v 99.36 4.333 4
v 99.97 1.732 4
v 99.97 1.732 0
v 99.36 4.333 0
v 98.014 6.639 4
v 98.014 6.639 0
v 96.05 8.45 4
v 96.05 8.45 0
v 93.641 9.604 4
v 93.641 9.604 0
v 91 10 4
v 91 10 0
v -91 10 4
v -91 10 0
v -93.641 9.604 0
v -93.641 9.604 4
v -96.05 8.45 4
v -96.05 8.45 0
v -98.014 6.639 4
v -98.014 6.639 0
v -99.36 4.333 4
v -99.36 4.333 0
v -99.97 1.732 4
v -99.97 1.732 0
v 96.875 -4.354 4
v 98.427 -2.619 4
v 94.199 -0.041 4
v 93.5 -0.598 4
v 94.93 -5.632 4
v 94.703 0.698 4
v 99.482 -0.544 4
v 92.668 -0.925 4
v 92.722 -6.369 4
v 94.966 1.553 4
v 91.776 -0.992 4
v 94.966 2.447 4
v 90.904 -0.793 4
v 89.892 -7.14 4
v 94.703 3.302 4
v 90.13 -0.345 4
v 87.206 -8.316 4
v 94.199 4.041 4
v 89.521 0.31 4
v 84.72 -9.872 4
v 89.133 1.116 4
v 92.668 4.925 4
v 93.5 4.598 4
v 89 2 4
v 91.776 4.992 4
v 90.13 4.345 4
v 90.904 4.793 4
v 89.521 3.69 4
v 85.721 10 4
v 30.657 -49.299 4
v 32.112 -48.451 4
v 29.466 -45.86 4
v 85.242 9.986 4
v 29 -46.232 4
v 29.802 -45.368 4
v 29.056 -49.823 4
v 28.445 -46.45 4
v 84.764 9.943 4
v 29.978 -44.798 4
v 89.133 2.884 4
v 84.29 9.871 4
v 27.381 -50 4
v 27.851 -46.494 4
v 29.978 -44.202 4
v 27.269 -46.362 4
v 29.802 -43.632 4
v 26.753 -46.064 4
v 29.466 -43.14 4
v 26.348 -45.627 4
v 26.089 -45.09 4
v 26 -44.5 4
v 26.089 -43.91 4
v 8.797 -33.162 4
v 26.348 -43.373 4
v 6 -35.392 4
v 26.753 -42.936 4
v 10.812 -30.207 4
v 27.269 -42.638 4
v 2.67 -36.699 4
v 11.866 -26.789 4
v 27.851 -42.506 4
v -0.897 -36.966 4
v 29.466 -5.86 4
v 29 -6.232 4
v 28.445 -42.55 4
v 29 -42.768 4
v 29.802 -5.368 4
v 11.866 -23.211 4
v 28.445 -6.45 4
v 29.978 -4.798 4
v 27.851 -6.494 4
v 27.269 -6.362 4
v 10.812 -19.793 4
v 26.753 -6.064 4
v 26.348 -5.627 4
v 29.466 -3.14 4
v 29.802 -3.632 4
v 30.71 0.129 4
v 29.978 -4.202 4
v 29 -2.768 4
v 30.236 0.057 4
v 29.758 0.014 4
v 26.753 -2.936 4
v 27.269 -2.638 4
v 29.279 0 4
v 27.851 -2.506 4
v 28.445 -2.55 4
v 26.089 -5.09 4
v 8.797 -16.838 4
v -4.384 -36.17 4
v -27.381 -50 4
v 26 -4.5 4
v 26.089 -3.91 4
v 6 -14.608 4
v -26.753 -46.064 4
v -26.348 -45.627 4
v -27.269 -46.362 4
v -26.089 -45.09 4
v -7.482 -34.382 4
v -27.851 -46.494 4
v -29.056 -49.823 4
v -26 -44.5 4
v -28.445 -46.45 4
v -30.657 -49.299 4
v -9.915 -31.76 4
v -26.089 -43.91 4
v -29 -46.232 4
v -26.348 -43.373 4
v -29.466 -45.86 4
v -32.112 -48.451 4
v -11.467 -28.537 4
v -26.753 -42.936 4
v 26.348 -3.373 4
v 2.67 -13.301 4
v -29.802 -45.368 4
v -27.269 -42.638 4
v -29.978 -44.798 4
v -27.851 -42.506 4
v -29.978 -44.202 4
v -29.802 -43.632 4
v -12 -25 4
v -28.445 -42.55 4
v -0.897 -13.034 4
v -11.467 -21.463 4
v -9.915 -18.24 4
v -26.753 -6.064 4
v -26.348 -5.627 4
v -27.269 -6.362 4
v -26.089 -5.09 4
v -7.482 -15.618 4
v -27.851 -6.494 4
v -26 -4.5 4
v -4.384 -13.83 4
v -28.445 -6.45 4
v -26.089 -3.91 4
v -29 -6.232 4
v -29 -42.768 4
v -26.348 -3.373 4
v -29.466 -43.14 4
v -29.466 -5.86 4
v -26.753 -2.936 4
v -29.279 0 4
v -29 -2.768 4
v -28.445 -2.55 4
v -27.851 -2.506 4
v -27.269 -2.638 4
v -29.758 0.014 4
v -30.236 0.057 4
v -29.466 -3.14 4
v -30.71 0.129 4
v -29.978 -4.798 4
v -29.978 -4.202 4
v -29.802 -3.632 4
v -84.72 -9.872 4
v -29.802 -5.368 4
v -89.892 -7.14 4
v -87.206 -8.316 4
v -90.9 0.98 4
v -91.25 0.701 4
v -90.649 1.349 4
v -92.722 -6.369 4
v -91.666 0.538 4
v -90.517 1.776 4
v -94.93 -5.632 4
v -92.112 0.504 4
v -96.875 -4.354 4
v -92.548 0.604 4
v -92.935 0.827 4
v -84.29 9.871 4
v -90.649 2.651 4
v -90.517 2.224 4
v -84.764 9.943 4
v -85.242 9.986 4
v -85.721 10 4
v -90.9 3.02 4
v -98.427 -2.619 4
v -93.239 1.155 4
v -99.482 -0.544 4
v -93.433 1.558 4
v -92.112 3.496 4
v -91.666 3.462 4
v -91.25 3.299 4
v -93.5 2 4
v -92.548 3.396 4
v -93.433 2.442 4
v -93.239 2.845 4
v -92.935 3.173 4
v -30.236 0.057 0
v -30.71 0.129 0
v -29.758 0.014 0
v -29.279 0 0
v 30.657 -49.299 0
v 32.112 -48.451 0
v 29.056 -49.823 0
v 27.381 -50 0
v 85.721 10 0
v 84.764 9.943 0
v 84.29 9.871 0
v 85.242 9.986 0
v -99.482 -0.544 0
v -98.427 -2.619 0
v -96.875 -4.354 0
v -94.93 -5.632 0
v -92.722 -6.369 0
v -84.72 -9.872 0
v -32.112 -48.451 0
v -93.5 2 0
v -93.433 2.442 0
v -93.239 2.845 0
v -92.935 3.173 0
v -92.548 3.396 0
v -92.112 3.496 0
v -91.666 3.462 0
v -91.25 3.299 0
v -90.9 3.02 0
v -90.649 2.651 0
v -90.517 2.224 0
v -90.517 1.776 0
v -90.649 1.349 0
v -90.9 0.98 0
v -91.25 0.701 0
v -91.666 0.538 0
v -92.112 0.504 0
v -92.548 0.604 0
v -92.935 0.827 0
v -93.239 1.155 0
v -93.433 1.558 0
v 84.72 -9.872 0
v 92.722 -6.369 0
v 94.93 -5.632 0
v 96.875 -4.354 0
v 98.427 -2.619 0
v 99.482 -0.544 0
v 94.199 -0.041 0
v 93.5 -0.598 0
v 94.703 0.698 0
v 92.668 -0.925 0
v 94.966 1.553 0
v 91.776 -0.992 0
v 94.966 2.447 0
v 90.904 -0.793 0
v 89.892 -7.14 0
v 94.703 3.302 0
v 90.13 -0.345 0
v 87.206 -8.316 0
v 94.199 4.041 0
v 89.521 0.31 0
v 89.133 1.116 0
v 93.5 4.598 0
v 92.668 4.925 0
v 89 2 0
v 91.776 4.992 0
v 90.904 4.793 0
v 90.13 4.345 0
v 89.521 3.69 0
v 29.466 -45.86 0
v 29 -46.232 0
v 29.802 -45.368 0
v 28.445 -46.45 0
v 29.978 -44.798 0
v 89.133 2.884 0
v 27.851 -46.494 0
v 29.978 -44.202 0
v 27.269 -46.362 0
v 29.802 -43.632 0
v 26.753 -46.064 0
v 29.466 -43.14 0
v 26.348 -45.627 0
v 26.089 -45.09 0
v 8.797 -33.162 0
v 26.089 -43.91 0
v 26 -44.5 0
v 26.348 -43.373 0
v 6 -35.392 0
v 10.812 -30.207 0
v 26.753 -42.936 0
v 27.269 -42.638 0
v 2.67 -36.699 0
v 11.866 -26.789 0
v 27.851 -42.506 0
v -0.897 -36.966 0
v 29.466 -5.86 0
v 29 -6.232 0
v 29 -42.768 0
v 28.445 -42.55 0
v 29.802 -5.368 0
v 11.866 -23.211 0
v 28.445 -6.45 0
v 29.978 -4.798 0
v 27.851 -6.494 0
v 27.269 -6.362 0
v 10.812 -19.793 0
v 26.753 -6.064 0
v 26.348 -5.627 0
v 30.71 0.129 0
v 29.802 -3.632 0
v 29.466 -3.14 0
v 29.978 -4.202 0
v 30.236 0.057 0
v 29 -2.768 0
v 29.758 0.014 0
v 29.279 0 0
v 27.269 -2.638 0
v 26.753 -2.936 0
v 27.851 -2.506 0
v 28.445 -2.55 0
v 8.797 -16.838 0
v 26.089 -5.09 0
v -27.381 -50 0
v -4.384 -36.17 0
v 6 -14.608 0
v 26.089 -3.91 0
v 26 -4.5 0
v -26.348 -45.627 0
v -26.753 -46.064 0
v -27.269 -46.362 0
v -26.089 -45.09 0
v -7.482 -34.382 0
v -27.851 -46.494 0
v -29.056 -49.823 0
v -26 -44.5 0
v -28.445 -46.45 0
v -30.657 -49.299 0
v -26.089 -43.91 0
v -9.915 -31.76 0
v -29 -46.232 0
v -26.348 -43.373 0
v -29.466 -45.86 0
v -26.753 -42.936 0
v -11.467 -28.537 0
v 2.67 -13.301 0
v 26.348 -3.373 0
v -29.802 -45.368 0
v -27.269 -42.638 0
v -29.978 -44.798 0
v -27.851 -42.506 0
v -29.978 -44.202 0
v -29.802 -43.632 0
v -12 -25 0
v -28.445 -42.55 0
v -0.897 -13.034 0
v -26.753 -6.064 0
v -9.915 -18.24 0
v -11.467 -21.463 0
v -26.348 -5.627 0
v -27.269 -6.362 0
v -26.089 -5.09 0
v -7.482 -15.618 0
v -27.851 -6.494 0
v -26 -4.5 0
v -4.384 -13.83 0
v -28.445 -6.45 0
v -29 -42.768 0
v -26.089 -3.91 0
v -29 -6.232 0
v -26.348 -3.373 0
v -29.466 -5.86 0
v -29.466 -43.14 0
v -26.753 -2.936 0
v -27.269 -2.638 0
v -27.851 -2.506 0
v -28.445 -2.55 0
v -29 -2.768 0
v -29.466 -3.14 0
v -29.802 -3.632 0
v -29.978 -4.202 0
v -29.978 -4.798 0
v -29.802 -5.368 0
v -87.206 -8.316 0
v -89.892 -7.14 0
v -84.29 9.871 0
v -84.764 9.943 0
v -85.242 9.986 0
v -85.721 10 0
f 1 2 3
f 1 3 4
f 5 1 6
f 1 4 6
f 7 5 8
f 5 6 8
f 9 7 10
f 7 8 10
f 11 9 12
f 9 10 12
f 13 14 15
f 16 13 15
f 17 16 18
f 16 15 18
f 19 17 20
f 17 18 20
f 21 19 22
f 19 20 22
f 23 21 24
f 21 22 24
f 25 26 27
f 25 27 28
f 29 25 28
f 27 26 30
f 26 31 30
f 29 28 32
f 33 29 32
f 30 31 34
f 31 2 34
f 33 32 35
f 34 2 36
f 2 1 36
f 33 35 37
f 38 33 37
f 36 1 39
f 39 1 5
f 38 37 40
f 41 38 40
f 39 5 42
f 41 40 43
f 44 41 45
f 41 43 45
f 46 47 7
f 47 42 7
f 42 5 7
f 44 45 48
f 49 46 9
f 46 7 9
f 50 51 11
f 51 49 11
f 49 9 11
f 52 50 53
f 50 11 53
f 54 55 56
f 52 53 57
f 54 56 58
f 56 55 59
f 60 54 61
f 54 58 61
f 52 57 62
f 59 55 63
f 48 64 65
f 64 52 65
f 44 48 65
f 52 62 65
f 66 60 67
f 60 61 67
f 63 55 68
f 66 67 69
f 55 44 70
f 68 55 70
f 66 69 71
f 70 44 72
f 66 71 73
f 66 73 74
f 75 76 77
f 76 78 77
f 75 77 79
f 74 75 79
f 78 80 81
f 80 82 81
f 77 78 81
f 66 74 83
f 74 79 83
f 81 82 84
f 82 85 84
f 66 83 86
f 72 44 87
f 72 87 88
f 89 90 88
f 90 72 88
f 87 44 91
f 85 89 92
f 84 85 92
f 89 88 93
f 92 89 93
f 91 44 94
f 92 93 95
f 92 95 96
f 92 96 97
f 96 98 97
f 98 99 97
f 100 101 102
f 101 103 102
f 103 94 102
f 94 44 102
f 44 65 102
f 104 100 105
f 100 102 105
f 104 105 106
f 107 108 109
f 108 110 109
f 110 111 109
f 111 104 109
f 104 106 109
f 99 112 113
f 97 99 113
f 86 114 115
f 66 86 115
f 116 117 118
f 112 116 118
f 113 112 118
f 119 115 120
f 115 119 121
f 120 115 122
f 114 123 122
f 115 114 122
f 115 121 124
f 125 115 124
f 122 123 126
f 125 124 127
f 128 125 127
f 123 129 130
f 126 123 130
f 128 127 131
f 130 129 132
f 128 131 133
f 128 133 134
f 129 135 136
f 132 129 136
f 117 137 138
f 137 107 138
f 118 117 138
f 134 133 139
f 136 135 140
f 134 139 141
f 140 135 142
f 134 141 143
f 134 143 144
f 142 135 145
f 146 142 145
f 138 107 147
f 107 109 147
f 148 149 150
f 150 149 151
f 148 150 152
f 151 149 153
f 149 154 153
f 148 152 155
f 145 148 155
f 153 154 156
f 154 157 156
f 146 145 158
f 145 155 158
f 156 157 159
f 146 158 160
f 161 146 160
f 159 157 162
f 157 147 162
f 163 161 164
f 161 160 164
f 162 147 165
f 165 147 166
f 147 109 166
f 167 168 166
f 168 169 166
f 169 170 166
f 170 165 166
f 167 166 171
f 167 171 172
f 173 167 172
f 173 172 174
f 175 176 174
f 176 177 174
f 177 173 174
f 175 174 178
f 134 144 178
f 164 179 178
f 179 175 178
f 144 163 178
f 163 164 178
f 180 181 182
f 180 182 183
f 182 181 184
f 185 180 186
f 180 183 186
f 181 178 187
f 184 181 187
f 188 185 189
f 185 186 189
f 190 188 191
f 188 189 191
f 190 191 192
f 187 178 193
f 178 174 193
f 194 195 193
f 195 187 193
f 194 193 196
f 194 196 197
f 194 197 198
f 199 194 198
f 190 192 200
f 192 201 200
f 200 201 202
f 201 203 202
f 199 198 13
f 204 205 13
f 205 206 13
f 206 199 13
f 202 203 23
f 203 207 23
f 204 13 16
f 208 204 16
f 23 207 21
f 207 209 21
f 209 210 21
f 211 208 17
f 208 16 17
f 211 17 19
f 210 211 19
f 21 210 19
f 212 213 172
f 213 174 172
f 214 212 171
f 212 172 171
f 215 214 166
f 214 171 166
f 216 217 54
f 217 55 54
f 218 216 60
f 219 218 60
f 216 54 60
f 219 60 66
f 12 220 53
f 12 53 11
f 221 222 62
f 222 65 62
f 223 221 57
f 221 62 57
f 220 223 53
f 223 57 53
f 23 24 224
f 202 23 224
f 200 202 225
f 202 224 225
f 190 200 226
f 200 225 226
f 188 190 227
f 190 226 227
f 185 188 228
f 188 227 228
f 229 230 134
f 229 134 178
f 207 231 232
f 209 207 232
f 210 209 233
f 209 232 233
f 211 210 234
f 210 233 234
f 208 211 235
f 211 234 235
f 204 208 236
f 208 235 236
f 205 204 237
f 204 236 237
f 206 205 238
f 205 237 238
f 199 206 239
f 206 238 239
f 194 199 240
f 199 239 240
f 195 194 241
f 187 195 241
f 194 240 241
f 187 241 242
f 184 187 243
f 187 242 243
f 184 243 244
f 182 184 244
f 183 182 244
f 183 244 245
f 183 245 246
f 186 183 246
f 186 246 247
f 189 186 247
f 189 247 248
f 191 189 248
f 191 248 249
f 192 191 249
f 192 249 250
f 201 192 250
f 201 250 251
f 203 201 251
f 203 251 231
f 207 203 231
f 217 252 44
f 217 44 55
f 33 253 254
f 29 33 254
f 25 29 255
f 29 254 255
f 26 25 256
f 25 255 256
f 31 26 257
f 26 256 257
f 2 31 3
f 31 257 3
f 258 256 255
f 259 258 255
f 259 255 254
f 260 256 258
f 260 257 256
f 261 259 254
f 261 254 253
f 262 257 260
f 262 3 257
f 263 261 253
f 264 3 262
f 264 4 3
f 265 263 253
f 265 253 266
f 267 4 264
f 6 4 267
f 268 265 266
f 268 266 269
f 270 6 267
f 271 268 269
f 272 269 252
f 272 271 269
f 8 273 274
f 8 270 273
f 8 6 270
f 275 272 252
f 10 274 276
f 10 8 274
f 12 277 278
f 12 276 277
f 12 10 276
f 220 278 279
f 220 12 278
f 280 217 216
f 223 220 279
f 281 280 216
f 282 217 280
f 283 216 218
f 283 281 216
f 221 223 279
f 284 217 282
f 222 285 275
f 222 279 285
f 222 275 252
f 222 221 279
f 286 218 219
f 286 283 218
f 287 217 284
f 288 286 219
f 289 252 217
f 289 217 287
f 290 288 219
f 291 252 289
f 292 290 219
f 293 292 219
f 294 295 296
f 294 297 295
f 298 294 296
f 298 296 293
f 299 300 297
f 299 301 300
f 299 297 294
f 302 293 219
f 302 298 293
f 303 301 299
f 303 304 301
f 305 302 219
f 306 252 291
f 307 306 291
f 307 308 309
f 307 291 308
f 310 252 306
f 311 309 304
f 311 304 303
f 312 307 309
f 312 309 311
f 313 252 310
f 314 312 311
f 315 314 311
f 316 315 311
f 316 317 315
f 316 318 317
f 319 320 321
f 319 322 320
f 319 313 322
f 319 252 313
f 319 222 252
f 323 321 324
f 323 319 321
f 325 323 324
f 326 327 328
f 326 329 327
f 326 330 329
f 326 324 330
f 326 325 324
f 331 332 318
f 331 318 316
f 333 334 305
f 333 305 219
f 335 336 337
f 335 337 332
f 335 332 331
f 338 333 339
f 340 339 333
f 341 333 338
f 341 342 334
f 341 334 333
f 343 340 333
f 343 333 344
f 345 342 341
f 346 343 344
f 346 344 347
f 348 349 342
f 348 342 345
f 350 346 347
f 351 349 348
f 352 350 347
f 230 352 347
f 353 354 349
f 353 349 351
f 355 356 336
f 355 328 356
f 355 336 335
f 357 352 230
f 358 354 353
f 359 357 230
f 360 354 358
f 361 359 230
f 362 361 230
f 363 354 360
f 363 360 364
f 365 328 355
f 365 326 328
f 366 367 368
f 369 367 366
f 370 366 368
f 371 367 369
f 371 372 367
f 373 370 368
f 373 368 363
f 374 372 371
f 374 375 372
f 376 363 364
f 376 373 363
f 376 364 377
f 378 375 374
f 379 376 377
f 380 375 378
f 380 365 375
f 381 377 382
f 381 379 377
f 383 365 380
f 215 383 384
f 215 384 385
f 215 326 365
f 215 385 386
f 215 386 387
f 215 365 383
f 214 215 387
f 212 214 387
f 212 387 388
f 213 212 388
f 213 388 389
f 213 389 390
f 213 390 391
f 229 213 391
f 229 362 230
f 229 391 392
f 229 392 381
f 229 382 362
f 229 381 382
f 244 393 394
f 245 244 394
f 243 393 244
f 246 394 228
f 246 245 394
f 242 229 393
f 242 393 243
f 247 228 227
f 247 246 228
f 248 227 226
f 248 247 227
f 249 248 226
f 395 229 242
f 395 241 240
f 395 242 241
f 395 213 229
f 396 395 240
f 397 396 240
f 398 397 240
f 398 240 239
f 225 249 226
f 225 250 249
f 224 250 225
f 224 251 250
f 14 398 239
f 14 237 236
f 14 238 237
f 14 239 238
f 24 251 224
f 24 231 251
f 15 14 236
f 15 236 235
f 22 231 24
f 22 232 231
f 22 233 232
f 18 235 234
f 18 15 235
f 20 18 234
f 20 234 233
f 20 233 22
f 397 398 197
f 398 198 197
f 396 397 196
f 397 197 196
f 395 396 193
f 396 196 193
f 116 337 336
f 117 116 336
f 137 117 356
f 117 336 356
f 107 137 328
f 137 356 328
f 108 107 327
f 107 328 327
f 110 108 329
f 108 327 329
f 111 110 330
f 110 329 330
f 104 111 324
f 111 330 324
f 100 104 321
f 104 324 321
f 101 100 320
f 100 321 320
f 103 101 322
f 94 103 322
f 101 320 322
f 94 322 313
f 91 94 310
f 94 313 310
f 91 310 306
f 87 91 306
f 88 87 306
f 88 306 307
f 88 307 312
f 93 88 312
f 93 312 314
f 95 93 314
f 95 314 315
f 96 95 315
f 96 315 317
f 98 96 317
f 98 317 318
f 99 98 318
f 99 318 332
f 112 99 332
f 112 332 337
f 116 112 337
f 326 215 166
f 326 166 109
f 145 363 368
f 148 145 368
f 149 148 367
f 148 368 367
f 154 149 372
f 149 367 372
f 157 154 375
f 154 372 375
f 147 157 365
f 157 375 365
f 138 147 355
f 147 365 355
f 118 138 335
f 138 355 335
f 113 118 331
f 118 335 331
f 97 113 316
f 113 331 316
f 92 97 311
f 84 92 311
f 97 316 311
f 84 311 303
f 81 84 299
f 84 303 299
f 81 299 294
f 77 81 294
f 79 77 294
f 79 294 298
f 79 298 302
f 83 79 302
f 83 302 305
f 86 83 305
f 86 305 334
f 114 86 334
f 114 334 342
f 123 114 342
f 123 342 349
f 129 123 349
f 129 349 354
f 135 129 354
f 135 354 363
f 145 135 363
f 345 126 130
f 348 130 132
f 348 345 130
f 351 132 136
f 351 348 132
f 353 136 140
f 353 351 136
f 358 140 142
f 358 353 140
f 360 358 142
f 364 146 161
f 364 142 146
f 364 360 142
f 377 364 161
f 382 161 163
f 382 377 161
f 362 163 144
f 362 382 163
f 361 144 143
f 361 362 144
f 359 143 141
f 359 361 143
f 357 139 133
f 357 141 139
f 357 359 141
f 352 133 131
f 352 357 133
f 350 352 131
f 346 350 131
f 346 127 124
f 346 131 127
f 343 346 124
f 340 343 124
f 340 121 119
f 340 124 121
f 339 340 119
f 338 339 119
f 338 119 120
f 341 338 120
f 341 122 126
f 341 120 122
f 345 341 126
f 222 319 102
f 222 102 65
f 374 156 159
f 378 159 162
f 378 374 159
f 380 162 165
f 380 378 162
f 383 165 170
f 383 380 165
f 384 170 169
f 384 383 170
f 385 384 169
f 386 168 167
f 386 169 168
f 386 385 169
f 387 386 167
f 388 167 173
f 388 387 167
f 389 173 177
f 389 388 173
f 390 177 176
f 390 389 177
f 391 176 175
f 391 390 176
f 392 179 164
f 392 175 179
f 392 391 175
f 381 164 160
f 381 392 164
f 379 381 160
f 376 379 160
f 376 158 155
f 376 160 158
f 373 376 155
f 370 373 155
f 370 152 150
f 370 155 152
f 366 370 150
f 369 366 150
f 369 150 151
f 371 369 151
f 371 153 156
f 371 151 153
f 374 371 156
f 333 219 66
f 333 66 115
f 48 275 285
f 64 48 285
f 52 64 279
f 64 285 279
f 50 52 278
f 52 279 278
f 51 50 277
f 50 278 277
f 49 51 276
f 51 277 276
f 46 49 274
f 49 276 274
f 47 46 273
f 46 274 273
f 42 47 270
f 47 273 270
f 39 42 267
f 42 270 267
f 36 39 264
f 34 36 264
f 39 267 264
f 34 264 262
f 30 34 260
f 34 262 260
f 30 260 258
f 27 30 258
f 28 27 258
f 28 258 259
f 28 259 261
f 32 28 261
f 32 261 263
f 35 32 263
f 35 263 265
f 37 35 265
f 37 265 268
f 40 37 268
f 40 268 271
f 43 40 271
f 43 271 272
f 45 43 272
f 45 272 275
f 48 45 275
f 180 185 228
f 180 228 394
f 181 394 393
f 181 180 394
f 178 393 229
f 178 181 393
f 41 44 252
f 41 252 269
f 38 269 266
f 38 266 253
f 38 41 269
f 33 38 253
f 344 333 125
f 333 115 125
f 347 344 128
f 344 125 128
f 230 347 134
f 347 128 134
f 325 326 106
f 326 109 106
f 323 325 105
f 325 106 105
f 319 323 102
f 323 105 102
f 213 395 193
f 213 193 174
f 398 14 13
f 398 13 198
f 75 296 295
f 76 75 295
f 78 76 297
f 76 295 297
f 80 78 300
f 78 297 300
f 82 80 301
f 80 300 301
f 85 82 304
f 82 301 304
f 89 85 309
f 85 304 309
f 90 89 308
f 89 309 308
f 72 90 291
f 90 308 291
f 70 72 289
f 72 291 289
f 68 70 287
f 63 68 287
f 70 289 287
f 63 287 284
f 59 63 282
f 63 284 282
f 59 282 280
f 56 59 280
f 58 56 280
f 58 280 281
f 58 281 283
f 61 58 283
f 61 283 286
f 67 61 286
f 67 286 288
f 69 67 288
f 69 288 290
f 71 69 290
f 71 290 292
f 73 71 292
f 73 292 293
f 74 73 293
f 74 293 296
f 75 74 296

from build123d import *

# Parameters (mm, degrees)
EXTRUDE_1_DEPTH     = 4
FILLET_1_R          = 8
FILLET_2_R          = 20
SKETCH_3_R          = 2
CUT_EXTRUDE_2_DEPTH = 112.874930168
SKETCH_2_R          = 12
CUT_EXTRUDE_1_DEPTH = 112.874930168
SKETCH_4_R          = 1.5
CUT_EXTRUDE_3_DEPTH = 112.874930168
FILLET_3_R          = 9
SKETCH_5_R          = 3
SKETCH_5_R_2        = 1.5
CUT_EXTRUDE_4_DEPTH = 25


with BuildPart() as part:
    # 草图1 → 凸台-拉伸1 (new body)
    with BuildSketch(Plane.XY):
        Polygon((-100, 10), (-85, 10), (-30, 0), (30, 0), (85, 10), (100, 10), (100, -6), (90, -6), (30, -50), (-30, -50), (-90, -6), (-100, -6), align=None)
    extrude(amount=EXTRUDE_1_DEPTH)

    # 圆角1
    fillet_1_edges = [part.edges().sort_by_distance(p)[0] for p in [
        (-85, 10, 2),
        (-30, 0, 2),
        (30, 0, 2),
        (85, 10, 2),
        (30, -50, 2),
        (-30, -50, 2),
    ]]
    fillet(fillet_1_edges, radius=FILLET_1_R)

    # 圆角2
    fillet_2_edges = [part.edges().sort_by_distance(p)[0] for p in [
        (90, -6, 2),
        (-90, -6, 2),
    ]]
    fillet(fillet_2_edges, radius=FILLET_2_R)

    # 草图3 → 切除-拉伸2 (cut, through all)
    with BuildSketch(Plane(origin=(0, 0, 0), x_dir=(-1, 0, 0), z_dir=(0, 0, -1))):
        with Locations((-28, -4.5)):
            Circle(SKETCH_3_R)
        with Locations((-28, -44.5)):
            Circle(SKETCH_3_R)
    cut_extrude_2 = extrude(amount=-CUT_EXTRUDE_2_DEPTH, mode=Mode.SUBTRACT)

    # 草图2 → 切除-拉伸1 (cut, through all)
    with BuildSketch(Plane(origin=(0, 0, 0), x_dir=(-1, 0, 0), z_dir=(0, 0, -1))):
        with Locations((0, -25)):
            Circle(SKETCH_2_R)
    extrude(amount=-CUT_EXTRUDE_1_DEPTH, mode=Mode.SUBTRACT)

    # 镜向1: 切除-拉伸2 across plane
    add(cut_extrude_2.mirror(Plane(origin=(0, 0, 0), x_dir=(0, 0, 1), z_dir=(1, 0, 0))), mode=Mode.SUBTRACT)

    # 草图4 → 切除-拉伸3 (cut, through all)
    with BuildSketch(Plane(origin=(0, 0, 0), x_dir=(-1, 0, 0), z_dir=(0, 0, -1))):
        with Locations((92, 2)):
            Circle(SKETCH_4_R)
    cut_extrude_3 = extrude(amount=-CUT_EXTRUDE_3_DEPTH, mode=Mode.SUBTRACT)

    # 镜向2: 切除-拉伸3 across plane
    add(cut_extrude_3.mirror(Plane(origin=(0, 0, 0), x_dir=(0, 0, 1), z_dir=(1, 0, 0))), mode=Mode.SUBTRACT)

    # 圆角3
    # the kernel refuses this fillet: 9 mm, written as the material it takes off along each edge
    with BuildSketch(Plane(origin=(100, -6, -21.161183572), x_dir=(-0.9987150456948208, -0.05067797847972915, 0), z_dir=(0, 0, 1))) as fillet_3_piece_1:
        with BuildLine():
            CenterArc((8.559473009, -8.909698774), FILLET_3_R, 98.123197137, 78.971924263)
            Line((-0.428962402, -8.453596967), (-1.327805943, -8.407986787))
            Line((-1.327805943, -8.407986787), (-0.898843541, 0.045610181))
            Line((-0.898843541, 0.045610181), (0.045610181, 0.898843541))
            ThreePointArc((0.045610181, 0.898843541), (3.493764236, 0.723873235), (7.160582737, 0.890969877))
            Line((7.160582737, 0.890969877), (7.28775458, 0))
        make_face()
    extrude(amount=46.322367144, mode=Mode.SUBTRACT)
    with BuildSketch(Plane(origin=(100, 10, -22.5), x_dir=(0, -1, 0), z_dir=(0, 0, 1))) as fillet_3_piece_2:
        with BuildLine():
            CenterArc((FILLET_3_R, -FILLET_3_R), FILLET_3_R, 90, 90)
            Line((0, -FILLET_3_R), (0, 0))
            Line((0, 0), (FILLET_3_R, 0))
        make_face()
    extrude(amount=49, mode=Mode.SUBTRACT)
    with BuildSketch(Plane(origin=(-100, -6, -21.161183572), x_dir=(0.9987150456948208, -0.05067797847972878, 0), z_dir=(0, 0, 1))) as fillet_3_piece_3:
        with BuildLine():
            CenterArc((8.559473009, 8.909698774), FILLET_3_R, 182.9048786, 78.971924263)
            Line((-0.428962402, 8.453596967), (-1.327805943, 8.407986787))
            Line((-1.327805943, 8.407986787), (-0.898843541, -0.045610181))
            Line((-0.898843541, -0.045610181), (0.045610181, -0.898843541))
            ThreePointArc((0.045610181, -0.898843541), (3.493764236, -0.723873235), (7.160582737, -0.890969877))
            Line((7.160582737, -0.890969877), (7.28775458, 0))
        make_face()
    extrude(amount=46.322367144, mode=Mode.SUBTRACT)
    with BuildSketch(Plane(origin=(-100, 10, -22.5), x_dir=(0, -1, 0), z_dir=(0, 0, 1))) as fillet_3_piece_4:
        with BuildLine():
            CenterArc((FILLET_3_R, FILLET_3_R), FILLET_3_R, 180, 90)
            Line((0, FILLET_3_R), (0, 0))
            Line((0, 0), (FILLET_3_R, 0))
        make_face()
    extrude(amount=49, mode=Mode.SUBTRACT)

    # 草图5 → 切除-拉伸4 (cut)
    with BuildSketch(Plane(origin=(0, 0, 0), x_dir=(-1, 0, 0), z_dir=(0, 0, -1))):
        with Locations((-92, 2)):
            Circle(SKETCH_5_R)
        with Locations((-92, 2)):
            Circle(SKETCH_5_R_2, mode=Mode.SUBTRACT)
    extrude(amount=-CUT_EXTRUDE_4_DEPTH, mode=Mode.SUBTRACT)


solid = part.part
